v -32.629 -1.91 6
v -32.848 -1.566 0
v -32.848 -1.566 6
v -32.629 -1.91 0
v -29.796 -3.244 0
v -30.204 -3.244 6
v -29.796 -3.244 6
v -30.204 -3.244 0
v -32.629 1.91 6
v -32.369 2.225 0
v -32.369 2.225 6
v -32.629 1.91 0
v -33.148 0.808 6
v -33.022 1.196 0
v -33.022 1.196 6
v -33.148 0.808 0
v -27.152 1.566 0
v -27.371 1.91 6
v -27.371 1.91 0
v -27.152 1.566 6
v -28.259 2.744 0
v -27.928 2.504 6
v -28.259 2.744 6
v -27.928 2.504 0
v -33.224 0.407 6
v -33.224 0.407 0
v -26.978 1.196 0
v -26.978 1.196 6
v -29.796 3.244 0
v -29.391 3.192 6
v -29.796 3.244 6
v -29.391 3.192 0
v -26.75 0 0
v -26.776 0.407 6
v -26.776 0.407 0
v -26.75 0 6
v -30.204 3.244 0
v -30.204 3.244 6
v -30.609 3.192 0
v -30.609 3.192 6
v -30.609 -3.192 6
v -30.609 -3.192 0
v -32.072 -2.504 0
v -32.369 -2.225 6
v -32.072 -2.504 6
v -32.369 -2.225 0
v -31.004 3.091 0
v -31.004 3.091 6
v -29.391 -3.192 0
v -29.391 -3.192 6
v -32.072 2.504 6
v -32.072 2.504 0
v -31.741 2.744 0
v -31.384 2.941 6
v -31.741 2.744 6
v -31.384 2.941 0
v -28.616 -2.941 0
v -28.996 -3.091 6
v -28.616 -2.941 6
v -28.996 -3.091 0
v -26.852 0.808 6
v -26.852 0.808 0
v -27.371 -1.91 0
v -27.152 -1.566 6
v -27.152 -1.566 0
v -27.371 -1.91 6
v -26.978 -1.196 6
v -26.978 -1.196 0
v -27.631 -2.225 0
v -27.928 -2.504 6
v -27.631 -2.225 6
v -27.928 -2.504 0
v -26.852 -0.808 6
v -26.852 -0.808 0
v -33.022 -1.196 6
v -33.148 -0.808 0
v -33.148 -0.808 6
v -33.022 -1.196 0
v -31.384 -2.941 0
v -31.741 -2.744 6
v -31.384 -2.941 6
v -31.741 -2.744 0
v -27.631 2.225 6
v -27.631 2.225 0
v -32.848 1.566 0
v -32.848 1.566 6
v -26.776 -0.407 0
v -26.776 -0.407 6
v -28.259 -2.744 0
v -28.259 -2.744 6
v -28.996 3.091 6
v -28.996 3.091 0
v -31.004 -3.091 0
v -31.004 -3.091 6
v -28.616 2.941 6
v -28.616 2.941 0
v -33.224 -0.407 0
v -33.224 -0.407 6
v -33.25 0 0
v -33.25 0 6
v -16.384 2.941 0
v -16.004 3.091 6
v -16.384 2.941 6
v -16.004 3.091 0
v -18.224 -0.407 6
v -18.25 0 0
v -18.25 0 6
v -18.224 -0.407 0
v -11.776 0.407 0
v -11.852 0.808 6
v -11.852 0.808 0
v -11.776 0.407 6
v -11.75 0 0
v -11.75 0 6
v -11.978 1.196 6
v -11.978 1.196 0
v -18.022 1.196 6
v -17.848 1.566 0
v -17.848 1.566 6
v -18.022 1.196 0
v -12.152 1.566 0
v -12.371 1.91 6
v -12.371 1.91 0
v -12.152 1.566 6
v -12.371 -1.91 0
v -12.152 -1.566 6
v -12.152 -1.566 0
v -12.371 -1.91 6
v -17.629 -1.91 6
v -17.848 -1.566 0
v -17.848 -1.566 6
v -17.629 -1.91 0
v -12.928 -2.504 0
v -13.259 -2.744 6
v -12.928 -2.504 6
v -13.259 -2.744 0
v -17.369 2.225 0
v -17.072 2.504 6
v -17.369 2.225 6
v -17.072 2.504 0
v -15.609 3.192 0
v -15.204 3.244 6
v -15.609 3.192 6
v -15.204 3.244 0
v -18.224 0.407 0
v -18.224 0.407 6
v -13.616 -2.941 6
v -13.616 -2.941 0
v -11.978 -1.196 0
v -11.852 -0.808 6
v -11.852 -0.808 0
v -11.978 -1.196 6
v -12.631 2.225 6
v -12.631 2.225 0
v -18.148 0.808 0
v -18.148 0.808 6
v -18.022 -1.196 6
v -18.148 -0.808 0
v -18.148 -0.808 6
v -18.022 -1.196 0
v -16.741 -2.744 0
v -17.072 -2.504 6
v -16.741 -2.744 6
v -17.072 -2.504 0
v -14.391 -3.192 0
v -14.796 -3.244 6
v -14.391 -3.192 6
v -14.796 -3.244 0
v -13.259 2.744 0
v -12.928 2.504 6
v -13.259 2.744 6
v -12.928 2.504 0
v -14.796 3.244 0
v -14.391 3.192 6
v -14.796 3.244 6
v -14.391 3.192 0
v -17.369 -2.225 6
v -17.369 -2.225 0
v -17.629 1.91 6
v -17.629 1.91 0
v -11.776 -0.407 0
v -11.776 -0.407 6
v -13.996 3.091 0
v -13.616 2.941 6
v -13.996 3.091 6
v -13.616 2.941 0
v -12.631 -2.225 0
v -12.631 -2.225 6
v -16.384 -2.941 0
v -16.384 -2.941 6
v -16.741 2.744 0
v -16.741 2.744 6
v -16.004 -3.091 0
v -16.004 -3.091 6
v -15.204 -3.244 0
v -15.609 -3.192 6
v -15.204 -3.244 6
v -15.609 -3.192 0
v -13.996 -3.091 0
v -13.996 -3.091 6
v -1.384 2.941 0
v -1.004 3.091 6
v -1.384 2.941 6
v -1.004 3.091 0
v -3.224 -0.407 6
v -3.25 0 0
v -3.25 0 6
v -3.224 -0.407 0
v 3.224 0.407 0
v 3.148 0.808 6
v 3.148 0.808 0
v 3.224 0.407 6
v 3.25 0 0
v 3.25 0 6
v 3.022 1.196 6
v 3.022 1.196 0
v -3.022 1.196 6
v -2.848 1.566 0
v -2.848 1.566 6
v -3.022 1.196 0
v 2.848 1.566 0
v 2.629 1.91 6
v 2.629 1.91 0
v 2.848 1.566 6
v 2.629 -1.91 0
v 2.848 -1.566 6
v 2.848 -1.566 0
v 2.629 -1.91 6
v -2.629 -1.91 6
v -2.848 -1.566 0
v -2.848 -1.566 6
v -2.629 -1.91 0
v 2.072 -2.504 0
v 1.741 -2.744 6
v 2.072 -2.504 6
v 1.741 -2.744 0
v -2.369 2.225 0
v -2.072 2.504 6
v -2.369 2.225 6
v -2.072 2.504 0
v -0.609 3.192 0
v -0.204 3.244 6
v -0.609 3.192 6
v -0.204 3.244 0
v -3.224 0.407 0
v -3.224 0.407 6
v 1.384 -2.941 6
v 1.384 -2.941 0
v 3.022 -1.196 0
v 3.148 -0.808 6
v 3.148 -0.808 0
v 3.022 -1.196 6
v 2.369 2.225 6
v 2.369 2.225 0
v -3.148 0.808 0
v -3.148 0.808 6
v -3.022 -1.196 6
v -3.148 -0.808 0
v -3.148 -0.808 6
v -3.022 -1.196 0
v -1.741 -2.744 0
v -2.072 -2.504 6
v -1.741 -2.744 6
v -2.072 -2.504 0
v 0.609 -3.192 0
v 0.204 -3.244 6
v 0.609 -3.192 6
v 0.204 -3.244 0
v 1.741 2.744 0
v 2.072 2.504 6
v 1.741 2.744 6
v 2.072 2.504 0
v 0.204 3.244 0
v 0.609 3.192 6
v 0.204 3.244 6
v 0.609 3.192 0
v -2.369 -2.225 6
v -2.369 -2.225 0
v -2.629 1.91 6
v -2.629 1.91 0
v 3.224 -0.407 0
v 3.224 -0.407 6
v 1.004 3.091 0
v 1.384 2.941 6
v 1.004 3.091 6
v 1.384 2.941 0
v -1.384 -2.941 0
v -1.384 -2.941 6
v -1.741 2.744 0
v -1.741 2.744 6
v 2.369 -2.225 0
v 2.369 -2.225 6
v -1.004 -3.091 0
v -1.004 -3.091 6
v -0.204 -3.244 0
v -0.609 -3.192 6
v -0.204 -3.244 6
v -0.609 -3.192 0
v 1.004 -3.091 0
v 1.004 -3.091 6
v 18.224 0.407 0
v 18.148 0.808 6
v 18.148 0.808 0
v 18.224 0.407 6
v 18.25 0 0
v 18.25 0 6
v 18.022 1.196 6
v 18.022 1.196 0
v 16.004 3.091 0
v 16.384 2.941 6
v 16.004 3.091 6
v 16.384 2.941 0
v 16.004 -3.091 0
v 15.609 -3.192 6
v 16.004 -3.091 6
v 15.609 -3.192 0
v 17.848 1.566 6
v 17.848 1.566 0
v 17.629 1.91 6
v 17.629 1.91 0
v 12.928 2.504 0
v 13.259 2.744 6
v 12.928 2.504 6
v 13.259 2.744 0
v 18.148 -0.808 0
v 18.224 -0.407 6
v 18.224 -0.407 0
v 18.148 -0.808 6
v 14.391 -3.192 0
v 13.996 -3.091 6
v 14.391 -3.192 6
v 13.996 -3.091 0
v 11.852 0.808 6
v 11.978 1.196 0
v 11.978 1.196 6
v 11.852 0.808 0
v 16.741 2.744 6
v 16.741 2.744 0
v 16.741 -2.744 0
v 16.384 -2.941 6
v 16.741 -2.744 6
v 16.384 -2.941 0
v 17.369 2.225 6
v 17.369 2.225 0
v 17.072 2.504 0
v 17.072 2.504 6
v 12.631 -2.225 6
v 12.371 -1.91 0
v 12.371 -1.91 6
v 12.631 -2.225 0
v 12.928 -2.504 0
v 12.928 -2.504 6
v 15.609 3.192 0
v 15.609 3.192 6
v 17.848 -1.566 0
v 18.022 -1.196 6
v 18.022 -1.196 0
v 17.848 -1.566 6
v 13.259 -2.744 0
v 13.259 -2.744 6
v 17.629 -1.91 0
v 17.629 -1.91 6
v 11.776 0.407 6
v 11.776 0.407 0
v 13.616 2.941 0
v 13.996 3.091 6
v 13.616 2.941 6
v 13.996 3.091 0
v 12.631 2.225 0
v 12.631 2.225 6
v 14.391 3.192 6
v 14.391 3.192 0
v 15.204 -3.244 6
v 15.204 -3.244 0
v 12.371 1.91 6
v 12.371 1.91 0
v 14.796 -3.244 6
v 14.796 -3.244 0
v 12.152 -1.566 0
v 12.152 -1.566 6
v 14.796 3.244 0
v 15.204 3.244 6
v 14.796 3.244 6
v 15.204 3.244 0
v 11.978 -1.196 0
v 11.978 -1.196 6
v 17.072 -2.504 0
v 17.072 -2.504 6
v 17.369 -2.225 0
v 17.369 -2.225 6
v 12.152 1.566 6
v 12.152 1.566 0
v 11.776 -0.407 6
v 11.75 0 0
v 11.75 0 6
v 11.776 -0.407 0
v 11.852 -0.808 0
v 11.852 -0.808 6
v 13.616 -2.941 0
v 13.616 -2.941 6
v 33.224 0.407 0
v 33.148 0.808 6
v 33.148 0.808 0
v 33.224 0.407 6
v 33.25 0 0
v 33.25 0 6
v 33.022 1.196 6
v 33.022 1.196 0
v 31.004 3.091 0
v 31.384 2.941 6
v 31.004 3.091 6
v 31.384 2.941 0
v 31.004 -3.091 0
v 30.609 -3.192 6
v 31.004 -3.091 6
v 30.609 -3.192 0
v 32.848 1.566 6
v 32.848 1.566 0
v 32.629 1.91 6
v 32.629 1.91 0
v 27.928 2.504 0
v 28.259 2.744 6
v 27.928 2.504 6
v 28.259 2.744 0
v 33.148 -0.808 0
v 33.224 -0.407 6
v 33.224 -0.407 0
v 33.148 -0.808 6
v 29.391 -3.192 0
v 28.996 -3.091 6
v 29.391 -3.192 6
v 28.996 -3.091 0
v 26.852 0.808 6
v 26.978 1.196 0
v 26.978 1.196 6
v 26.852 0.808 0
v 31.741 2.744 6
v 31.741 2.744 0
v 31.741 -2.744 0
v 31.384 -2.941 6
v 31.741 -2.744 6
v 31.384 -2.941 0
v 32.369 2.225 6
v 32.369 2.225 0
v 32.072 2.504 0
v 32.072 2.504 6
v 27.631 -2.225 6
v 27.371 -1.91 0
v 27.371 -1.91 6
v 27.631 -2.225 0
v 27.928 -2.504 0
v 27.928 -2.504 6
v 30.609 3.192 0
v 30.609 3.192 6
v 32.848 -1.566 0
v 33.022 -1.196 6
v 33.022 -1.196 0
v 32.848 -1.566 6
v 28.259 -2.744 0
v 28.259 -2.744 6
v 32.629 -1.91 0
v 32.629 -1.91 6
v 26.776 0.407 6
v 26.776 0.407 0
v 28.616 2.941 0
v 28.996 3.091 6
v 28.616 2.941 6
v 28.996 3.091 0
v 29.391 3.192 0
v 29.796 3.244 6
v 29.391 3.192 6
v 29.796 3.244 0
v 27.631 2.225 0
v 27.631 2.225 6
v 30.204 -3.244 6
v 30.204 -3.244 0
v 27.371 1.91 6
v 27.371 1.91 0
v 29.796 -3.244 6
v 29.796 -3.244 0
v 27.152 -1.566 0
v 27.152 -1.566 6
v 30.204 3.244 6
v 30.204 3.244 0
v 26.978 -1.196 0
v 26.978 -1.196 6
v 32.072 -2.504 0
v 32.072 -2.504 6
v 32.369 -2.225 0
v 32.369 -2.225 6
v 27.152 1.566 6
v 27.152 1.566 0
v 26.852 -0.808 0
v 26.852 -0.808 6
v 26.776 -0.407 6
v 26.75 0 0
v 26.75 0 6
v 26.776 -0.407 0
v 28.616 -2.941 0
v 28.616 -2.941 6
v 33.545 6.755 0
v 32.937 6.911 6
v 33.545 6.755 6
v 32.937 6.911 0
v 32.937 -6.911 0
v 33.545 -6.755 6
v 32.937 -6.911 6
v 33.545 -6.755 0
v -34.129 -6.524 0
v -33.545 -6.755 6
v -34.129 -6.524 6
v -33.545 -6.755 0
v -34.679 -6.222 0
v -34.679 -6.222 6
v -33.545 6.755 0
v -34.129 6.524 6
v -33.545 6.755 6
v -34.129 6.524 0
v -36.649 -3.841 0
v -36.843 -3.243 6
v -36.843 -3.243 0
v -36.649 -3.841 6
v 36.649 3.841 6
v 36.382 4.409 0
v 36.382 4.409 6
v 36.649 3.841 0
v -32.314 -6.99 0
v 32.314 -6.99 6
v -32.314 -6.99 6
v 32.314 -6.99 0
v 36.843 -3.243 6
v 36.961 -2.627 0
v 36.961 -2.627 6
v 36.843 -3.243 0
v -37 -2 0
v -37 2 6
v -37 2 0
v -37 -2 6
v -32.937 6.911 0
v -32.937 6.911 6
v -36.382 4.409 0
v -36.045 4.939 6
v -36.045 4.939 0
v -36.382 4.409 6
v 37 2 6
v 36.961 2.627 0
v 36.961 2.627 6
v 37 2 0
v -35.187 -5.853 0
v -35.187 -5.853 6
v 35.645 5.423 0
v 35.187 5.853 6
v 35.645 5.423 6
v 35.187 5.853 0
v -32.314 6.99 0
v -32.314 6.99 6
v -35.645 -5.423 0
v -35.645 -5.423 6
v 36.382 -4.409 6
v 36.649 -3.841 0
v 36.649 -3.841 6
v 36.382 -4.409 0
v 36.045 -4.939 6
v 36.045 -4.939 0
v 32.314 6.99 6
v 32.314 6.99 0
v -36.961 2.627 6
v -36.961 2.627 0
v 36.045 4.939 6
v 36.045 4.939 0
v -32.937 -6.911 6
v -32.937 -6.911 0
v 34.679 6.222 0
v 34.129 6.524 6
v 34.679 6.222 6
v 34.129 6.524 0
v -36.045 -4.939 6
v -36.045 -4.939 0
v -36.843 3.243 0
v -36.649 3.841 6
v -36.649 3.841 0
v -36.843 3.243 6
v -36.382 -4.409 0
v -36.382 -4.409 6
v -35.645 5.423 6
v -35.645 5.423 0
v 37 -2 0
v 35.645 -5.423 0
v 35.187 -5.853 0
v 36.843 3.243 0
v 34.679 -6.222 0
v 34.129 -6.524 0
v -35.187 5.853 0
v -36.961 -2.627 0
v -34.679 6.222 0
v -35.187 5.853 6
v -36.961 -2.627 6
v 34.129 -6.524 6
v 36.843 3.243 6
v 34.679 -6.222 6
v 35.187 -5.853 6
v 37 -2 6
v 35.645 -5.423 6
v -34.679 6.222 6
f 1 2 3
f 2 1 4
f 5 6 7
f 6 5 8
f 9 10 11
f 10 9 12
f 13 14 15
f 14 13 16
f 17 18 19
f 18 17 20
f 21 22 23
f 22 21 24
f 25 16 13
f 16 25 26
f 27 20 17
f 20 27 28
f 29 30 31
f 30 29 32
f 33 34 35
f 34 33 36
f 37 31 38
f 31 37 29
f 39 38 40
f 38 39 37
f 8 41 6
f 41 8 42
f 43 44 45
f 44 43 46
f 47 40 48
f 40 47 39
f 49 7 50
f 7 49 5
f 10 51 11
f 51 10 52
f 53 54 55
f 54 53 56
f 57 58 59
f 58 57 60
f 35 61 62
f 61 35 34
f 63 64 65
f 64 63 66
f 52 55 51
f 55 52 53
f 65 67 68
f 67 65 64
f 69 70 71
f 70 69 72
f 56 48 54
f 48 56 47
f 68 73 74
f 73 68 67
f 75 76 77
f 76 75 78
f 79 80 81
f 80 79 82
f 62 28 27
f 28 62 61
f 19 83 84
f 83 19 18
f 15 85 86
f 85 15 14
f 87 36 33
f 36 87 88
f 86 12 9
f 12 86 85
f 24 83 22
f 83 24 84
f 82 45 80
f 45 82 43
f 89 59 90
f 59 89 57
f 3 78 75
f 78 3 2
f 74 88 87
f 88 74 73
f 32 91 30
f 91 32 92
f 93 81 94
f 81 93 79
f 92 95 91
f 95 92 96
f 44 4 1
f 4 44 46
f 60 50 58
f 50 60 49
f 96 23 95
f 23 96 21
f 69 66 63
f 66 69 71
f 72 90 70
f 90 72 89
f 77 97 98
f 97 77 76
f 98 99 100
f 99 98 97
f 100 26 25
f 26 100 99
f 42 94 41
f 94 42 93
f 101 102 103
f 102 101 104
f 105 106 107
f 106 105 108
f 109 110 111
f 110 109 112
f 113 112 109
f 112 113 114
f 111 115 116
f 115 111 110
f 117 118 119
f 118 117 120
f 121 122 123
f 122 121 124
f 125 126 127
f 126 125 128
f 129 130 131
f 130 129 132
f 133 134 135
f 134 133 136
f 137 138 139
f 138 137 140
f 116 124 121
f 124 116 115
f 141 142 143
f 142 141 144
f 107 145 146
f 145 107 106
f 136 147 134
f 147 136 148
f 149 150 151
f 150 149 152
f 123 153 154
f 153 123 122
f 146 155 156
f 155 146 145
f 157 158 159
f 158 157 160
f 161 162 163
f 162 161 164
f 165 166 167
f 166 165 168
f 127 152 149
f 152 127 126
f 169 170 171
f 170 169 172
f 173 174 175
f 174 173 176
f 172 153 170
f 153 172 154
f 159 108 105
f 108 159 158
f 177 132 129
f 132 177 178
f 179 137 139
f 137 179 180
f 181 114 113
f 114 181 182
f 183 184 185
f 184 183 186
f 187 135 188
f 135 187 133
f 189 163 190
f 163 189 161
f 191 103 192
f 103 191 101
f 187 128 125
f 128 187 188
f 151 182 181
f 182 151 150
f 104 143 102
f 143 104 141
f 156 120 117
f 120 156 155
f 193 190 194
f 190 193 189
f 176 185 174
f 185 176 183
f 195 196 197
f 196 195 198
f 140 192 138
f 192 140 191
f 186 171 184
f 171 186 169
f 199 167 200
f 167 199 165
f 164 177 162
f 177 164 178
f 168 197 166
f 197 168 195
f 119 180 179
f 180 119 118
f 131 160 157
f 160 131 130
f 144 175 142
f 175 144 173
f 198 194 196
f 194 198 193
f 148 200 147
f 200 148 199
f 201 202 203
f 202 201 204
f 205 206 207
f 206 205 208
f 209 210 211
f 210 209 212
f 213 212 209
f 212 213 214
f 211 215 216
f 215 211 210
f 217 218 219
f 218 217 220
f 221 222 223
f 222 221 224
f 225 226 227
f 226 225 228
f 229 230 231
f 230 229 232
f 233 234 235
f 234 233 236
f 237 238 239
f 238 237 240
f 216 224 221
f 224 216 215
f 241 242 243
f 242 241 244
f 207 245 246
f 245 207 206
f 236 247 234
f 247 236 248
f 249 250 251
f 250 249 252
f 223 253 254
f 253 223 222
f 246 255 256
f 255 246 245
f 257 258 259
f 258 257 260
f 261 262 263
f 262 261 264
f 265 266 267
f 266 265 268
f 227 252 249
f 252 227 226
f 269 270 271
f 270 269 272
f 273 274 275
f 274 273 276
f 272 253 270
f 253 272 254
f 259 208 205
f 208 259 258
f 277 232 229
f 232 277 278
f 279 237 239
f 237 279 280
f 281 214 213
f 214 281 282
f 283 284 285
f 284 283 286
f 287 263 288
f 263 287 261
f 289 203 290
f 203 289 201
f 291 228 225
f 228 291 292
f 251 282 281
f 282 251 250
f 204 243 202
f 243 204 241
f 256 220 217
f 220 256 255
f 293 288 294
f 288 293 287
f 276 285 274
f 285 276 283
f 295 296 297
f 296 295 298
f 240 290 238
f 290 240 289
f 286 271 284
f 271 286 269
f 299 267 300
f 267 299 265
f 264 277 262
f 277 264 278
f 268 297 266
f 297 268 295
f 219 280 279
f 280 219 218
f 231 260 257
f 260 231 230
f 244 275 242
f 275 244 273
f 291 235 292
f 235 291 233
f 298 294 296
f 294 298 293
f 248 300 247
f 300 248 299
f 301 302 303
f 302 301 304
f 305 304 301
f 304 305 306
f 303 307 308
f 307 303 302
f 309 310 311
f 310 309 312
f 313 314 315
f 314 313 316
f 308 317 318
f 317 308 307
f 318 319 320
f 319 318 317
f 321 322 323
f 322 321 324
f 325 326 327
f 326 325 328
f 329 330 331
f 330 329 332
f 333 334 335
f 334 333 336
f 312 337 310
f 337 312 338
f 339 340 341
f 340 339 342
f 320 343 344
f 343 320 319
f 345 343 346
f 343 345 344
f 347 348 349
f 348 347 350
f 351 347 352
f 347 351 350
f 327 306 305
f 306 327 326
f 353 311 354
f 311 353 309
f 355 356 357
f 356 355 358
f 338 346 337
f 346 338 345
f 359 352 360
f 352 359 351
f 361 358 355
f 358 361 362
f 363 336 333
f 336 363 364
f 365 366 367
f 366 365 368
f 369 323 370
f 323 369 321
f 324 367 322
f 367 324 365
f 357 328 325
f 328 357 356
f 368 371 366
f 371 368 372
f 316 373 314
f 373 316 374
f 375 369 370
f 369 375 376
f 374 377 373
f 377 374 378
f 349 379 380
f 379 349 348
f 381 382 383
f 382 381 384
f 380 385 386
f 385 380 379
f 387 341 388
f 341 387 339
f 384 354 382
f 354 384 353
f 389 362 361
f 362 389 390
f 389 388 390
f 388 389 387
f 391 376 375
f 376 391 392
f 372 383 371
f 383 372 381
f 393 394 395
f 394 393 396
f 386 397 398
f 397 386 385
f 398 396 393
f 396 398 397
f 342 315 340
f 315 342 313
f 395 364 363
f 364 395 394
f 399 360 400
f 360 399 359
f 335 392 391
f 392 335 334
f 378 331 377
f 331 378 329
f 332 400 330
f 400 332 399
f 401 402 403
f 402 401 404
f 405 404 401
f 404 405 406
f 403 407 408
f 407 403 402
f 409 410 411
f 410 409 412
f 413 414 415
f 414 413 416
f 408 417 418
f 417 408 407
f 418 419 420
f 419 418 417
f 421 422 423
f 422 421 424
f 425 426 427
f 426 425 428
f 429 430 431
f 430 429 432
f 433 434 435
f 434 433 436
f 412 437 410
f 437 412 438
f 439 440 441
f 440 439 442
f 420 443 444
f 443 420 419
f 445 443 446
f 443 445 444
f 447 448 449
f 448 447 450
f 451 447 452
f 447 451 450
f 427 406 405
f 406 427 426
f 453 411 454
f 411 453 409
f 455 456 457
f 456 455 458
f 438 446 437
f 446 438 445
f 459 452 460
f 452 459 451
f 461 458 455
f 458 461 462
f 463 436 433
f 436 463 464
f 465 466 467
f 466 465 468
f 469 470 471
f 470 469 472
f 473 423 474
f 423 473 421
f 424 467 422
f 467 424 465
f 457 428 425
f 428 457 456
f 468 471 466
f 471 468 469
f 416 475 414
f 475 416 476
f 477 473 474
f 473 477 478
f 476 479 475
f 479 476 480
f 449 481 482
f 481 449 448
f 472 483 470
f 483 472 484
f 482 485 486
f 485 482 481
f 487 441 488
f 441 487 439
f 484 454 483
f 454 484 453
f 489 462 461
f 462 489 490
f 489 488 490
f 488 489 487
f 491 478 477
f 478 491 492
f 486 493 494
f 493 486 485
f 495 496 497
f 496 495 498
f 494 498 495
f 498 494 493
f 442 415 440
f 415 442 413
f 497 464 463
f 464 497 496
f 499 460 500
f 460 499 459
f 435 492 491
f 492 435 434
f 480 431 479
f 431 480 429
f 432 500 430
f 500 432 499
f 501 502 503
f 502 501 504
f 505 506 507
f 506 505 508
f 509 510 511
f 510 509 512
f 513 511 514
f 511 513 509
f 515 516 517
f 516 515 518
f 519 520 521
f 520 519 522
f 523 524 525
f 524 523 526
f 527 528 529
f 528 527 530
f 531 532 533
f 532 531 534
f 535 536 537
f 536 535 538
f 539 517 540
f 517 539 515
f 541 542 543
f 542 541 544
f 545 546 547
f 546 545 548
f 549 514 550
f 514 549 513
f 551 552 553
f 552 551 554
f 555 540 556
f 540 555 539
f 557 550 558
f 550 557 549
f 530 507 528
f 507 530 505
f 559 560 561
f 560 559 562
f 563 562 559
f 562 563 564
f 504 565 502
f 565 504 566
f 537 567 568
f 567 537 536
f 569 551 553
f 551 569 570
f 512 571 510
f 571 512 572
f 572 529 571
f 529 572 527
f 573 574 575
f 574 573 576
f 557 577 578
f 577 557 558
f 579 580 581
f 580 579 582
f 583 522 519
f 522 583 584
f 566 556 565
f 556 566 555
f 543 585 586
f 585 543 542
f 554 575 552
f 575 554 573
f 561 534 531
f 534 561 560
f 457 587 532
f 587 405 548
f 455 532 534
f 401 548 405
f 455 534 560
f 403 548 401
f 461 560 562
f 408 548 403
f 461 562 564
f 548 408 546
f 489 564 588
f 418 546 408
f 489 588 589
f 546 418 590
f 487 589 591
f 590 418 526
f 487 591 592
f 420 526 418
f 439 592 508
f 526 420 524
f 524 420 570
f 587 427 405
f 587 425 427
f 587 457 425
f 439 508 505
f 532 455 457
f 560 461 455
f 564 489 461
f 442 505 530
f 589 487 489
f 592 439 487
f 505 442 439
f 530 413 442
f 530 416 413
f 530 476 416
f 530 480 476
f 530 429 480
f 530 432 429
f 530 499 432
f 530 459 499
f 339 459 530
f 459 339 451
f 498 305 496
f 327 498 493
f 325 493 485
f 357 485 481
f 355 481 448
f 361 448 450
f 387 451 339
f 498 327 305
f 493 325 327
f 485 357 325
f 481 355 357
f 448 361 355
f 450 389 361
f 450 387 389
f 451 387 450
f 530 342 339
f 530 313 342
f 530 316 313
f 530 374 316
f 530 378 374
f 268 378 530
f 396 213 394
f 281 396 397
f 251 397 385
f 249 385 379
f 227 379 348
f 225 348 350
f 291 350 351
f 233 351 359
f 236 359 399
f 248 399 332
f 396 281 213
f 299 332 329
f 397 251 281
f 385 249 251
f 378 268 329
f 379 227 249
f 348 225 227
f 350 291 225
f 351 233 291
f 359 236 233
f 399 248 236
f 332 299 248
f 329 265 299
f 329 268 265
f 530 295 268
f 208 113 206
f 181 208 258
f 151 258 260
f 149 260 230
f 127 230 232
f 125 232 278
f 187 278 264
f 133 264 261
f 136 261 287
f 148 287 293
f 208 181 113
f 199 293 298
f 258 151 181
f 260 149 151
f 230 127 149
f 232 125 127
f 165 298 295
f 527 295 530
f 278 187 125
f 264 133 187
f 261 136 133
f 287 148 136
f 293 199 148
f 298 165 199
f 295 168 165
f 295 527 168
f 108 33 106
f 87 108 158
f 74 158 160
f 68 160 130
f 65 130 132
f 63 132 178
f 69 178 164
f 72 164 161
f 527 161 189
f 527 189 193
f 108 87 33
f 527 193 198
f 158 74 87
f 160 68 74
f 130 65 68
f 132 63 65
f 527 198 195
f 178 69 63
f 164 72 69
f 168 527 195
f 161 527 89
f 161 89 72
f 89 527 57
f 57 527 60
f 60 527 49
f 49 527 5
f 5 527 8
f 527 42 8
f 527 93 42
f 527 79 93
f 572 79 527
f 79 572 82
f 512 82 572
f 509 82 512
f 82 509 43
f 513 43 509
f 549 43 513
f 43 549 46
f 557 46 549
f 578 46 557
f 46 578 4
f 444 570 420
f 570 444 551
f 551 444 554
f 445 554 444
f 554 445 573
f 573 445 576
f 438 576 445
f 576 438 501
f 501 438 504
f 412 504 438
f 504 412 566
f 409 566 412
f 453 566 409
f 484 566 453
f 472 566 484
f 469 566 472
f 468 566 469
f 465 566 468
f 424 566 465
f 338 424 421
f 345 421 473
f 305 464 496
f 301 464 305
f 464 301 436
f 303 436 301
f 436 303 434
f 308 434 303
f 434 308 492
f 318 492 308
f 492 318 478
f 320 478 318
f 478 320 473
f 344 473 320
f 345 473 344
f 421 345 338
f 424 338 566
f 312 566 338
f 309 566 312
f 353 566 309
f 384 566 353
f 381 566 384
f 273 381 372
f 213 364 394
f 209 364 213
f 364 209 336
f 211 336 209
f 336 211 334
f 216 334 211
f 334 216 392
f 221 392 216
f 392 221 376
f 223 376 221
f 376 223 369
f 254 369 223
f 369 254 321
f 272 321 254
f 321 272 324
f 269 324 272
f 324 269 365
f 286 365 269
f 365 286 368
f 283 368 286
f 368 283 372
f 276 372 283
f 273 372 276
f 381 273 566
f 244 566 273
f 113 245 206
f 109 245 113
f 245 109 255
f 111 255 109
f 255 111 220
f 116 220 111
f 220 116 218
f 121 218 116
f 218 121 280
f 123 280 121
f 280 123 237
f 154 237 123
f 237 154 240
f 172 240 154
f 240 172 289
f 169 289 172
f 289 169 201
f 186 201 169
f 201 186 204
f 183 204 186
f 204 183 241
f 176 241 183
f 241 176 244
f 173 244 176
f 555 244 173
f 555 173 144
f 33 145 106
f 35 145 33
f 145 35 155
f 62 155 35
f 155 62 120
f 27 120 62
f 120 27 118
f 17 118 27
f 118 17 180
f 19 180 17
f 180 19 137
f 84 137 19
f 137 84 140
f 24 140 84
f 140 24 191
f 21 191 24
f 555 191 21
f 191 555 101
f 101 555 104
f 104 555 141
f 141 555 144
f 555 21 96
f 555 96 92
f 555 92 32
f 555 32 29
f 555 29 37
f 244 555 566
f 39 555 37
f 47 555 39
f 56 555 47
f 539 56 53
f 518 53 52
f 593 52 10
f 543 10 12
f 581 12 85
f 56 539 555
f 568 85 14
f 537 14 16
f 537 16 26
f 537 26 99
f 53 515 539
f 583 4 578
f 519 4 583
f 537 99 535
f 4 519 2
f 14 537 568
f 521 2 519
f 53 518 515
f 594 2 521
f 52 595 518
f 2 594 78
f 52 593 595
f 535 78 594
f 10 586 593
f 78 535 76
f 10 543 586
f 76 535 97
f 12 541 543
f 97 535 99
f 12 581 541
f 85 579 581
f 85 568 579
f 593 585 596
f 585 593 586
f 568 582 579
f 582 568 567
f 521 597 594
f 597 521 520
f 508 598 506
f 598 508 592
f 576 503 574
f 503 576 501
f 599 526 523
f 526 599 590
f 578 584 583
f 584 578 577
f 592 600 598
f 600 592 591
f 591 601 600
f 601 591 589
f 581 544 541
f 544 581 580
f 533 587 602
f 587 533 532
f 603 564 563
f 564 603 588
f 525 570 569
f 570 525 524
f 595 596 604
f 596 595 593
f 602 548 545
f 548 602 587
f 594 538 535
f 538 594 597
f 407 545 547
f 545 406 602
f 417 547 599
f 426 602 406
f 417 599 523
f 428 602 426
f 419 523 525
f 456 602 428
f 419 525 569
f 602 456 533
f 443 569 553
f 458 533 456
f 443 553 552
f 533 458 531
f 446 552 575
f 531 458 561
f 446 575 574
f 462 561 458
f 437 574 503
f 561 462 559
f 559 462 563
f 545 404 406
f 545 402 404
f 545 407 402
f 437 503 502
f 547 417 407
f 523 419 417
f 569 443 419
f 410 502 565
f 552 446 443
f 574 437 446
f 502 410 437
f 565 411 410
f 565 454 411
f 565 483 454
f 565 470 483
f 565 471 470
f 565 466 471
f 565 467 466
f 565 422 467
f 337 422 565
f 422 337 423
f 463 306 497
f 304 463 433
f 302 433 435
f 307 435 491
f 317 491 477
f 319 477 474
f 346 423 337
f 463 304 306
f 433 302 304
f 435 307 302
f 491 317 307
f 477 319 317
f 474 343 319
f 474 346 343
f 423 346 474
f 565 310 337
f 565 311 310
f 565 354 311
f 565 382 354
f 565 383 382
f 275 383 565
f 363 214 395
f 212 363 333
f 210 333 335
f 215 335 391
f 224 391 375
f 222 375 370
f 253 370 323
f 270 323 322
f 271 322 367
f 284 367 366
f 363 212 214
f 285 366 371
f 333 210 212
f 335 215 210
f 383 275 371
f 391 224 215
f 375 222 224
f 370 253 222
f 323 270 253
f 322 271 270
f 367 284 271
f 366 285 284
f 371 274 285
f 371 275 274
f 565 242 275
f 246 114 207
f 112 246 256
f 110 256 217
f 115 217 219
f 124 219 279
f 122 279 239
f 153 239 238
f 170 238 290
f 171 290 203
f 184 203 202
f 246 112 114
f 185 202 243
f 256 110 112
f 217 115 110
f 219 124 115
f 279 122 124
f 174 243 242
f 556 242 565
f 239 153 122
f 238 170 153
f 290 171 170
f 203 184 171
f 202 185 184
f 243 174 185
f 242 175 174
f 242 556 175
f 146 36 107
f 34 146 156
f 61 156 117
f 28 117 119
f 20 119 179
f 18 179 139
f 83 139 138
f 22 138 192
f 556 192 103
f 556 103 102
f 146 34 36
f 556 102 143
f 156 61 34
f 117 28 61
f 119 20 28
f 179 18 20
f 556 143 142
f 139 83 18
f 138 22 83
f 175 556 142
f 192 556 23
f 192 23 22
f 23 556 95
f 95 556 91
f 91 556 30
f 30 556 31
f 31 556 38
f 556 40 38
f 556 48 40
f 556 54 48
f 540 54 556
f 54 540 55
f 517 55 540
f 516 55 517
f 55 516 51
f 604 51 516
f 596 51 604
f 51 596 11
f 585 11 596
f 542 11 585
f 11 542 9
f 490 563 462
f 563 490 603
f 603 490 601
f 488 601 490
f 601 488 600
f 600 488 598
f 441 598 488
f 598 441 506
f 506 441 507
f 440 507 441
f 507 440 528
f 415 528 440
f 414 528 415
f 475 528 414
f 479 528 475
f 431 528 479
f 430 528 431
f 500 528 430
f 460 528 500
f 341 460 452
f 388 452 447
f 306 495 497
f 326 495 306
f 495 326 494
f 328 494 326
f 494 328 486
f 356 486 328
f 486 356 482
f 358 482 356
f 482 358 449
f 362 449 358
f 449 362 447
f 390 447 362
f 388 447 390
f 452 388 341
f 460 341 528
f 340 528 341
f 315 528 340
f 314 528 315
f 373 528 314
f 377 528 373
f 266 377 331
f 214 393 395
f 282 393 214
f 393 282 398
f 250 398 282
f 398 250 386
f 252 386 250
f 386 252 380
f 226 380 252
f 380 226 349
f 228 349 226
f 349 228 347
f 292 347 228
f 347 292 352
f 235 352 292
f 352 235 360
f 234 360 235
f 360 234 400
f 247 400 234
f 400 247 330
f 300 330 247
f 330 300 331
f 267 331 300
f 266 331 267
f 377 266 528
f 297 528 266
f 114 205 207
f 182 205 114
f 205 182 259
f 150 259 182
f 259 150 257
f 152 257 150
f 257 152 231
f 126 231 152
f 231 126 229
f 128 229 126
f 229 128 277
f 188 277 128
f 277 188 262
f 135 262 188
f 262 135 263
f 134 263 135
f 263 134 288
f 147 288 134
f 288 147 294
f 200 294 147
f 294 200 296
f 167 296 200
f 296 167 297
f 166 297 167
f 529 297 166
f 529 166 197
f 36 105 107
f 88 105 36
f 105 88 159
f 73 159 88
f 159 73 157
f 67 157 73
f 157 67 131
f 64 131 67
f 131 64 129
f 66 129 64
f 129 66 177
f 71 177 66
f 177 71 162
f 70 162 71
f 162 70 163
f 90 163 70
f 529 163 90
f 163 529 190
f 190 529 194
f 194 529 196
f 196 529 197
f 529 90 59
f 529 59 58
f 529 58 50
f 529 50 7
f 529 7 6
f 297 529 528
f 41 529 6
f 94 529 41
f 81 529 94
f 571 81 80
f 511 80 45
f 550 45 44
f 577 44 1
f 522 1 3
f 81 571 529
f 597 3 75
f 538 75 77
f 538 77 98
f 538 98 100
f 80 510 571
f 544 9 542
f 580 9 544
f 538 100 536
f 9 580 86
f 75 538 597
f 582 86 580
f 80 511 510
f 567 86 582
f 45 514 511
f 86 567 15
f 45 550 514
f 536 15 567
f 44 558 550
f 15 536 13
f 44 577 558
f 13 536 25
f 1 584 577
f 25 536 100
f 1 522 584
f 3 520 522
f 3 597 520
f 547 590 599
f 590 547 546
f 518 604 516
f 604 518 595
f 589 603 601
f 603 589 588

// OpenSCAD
$fn = 50;


difference() {
	union() {
		hull() {
			translate(v = [-32.0000000000, 2.0000000000, 0]) {
				cylinder(h = 6, r = 5);
			}
			translate(v = [32.0000000000, 2.0000000000, 0]) {
				cylinder(h = 6, r = 5);
			}
			translate(v = [-32.0000000000, -2.0000000000, 0]) {
				cylinder(h = 6, r = 5);
			}
			translate(v = [32.0000000000, -2.0000000000, 0]) {
				cylinder(h = 6, r = 5);
			}
		}
	}
	union() {
		translate(v = [-30.0000000000, 0.0000000000, -100.0000000000]) {
			cylinder(h = 200, r = 3.2500000000);
		}
		translate(v = [-15.0000000000, 0.0000000000, -100.0000000000]) {
			cylinder(h = 200, r = 3.2500000000);
		}
		translate(v = [0.0000000000, 0.0000000000, -100.0000000000]) {
			cylinder(h = 200, r = 3.2500000000);
		}
		translate(v = [15.0000000000, 0.0000000000, -100.0000000000]) {
			cylinder(h = 200, r = 3.2500000000);
		}
		translate(v = [30.0000000000, 0.0000000000, -100.0000000000]) {
			cylinder(h = 200, r = 3.2500000000);
		}
	}
}
